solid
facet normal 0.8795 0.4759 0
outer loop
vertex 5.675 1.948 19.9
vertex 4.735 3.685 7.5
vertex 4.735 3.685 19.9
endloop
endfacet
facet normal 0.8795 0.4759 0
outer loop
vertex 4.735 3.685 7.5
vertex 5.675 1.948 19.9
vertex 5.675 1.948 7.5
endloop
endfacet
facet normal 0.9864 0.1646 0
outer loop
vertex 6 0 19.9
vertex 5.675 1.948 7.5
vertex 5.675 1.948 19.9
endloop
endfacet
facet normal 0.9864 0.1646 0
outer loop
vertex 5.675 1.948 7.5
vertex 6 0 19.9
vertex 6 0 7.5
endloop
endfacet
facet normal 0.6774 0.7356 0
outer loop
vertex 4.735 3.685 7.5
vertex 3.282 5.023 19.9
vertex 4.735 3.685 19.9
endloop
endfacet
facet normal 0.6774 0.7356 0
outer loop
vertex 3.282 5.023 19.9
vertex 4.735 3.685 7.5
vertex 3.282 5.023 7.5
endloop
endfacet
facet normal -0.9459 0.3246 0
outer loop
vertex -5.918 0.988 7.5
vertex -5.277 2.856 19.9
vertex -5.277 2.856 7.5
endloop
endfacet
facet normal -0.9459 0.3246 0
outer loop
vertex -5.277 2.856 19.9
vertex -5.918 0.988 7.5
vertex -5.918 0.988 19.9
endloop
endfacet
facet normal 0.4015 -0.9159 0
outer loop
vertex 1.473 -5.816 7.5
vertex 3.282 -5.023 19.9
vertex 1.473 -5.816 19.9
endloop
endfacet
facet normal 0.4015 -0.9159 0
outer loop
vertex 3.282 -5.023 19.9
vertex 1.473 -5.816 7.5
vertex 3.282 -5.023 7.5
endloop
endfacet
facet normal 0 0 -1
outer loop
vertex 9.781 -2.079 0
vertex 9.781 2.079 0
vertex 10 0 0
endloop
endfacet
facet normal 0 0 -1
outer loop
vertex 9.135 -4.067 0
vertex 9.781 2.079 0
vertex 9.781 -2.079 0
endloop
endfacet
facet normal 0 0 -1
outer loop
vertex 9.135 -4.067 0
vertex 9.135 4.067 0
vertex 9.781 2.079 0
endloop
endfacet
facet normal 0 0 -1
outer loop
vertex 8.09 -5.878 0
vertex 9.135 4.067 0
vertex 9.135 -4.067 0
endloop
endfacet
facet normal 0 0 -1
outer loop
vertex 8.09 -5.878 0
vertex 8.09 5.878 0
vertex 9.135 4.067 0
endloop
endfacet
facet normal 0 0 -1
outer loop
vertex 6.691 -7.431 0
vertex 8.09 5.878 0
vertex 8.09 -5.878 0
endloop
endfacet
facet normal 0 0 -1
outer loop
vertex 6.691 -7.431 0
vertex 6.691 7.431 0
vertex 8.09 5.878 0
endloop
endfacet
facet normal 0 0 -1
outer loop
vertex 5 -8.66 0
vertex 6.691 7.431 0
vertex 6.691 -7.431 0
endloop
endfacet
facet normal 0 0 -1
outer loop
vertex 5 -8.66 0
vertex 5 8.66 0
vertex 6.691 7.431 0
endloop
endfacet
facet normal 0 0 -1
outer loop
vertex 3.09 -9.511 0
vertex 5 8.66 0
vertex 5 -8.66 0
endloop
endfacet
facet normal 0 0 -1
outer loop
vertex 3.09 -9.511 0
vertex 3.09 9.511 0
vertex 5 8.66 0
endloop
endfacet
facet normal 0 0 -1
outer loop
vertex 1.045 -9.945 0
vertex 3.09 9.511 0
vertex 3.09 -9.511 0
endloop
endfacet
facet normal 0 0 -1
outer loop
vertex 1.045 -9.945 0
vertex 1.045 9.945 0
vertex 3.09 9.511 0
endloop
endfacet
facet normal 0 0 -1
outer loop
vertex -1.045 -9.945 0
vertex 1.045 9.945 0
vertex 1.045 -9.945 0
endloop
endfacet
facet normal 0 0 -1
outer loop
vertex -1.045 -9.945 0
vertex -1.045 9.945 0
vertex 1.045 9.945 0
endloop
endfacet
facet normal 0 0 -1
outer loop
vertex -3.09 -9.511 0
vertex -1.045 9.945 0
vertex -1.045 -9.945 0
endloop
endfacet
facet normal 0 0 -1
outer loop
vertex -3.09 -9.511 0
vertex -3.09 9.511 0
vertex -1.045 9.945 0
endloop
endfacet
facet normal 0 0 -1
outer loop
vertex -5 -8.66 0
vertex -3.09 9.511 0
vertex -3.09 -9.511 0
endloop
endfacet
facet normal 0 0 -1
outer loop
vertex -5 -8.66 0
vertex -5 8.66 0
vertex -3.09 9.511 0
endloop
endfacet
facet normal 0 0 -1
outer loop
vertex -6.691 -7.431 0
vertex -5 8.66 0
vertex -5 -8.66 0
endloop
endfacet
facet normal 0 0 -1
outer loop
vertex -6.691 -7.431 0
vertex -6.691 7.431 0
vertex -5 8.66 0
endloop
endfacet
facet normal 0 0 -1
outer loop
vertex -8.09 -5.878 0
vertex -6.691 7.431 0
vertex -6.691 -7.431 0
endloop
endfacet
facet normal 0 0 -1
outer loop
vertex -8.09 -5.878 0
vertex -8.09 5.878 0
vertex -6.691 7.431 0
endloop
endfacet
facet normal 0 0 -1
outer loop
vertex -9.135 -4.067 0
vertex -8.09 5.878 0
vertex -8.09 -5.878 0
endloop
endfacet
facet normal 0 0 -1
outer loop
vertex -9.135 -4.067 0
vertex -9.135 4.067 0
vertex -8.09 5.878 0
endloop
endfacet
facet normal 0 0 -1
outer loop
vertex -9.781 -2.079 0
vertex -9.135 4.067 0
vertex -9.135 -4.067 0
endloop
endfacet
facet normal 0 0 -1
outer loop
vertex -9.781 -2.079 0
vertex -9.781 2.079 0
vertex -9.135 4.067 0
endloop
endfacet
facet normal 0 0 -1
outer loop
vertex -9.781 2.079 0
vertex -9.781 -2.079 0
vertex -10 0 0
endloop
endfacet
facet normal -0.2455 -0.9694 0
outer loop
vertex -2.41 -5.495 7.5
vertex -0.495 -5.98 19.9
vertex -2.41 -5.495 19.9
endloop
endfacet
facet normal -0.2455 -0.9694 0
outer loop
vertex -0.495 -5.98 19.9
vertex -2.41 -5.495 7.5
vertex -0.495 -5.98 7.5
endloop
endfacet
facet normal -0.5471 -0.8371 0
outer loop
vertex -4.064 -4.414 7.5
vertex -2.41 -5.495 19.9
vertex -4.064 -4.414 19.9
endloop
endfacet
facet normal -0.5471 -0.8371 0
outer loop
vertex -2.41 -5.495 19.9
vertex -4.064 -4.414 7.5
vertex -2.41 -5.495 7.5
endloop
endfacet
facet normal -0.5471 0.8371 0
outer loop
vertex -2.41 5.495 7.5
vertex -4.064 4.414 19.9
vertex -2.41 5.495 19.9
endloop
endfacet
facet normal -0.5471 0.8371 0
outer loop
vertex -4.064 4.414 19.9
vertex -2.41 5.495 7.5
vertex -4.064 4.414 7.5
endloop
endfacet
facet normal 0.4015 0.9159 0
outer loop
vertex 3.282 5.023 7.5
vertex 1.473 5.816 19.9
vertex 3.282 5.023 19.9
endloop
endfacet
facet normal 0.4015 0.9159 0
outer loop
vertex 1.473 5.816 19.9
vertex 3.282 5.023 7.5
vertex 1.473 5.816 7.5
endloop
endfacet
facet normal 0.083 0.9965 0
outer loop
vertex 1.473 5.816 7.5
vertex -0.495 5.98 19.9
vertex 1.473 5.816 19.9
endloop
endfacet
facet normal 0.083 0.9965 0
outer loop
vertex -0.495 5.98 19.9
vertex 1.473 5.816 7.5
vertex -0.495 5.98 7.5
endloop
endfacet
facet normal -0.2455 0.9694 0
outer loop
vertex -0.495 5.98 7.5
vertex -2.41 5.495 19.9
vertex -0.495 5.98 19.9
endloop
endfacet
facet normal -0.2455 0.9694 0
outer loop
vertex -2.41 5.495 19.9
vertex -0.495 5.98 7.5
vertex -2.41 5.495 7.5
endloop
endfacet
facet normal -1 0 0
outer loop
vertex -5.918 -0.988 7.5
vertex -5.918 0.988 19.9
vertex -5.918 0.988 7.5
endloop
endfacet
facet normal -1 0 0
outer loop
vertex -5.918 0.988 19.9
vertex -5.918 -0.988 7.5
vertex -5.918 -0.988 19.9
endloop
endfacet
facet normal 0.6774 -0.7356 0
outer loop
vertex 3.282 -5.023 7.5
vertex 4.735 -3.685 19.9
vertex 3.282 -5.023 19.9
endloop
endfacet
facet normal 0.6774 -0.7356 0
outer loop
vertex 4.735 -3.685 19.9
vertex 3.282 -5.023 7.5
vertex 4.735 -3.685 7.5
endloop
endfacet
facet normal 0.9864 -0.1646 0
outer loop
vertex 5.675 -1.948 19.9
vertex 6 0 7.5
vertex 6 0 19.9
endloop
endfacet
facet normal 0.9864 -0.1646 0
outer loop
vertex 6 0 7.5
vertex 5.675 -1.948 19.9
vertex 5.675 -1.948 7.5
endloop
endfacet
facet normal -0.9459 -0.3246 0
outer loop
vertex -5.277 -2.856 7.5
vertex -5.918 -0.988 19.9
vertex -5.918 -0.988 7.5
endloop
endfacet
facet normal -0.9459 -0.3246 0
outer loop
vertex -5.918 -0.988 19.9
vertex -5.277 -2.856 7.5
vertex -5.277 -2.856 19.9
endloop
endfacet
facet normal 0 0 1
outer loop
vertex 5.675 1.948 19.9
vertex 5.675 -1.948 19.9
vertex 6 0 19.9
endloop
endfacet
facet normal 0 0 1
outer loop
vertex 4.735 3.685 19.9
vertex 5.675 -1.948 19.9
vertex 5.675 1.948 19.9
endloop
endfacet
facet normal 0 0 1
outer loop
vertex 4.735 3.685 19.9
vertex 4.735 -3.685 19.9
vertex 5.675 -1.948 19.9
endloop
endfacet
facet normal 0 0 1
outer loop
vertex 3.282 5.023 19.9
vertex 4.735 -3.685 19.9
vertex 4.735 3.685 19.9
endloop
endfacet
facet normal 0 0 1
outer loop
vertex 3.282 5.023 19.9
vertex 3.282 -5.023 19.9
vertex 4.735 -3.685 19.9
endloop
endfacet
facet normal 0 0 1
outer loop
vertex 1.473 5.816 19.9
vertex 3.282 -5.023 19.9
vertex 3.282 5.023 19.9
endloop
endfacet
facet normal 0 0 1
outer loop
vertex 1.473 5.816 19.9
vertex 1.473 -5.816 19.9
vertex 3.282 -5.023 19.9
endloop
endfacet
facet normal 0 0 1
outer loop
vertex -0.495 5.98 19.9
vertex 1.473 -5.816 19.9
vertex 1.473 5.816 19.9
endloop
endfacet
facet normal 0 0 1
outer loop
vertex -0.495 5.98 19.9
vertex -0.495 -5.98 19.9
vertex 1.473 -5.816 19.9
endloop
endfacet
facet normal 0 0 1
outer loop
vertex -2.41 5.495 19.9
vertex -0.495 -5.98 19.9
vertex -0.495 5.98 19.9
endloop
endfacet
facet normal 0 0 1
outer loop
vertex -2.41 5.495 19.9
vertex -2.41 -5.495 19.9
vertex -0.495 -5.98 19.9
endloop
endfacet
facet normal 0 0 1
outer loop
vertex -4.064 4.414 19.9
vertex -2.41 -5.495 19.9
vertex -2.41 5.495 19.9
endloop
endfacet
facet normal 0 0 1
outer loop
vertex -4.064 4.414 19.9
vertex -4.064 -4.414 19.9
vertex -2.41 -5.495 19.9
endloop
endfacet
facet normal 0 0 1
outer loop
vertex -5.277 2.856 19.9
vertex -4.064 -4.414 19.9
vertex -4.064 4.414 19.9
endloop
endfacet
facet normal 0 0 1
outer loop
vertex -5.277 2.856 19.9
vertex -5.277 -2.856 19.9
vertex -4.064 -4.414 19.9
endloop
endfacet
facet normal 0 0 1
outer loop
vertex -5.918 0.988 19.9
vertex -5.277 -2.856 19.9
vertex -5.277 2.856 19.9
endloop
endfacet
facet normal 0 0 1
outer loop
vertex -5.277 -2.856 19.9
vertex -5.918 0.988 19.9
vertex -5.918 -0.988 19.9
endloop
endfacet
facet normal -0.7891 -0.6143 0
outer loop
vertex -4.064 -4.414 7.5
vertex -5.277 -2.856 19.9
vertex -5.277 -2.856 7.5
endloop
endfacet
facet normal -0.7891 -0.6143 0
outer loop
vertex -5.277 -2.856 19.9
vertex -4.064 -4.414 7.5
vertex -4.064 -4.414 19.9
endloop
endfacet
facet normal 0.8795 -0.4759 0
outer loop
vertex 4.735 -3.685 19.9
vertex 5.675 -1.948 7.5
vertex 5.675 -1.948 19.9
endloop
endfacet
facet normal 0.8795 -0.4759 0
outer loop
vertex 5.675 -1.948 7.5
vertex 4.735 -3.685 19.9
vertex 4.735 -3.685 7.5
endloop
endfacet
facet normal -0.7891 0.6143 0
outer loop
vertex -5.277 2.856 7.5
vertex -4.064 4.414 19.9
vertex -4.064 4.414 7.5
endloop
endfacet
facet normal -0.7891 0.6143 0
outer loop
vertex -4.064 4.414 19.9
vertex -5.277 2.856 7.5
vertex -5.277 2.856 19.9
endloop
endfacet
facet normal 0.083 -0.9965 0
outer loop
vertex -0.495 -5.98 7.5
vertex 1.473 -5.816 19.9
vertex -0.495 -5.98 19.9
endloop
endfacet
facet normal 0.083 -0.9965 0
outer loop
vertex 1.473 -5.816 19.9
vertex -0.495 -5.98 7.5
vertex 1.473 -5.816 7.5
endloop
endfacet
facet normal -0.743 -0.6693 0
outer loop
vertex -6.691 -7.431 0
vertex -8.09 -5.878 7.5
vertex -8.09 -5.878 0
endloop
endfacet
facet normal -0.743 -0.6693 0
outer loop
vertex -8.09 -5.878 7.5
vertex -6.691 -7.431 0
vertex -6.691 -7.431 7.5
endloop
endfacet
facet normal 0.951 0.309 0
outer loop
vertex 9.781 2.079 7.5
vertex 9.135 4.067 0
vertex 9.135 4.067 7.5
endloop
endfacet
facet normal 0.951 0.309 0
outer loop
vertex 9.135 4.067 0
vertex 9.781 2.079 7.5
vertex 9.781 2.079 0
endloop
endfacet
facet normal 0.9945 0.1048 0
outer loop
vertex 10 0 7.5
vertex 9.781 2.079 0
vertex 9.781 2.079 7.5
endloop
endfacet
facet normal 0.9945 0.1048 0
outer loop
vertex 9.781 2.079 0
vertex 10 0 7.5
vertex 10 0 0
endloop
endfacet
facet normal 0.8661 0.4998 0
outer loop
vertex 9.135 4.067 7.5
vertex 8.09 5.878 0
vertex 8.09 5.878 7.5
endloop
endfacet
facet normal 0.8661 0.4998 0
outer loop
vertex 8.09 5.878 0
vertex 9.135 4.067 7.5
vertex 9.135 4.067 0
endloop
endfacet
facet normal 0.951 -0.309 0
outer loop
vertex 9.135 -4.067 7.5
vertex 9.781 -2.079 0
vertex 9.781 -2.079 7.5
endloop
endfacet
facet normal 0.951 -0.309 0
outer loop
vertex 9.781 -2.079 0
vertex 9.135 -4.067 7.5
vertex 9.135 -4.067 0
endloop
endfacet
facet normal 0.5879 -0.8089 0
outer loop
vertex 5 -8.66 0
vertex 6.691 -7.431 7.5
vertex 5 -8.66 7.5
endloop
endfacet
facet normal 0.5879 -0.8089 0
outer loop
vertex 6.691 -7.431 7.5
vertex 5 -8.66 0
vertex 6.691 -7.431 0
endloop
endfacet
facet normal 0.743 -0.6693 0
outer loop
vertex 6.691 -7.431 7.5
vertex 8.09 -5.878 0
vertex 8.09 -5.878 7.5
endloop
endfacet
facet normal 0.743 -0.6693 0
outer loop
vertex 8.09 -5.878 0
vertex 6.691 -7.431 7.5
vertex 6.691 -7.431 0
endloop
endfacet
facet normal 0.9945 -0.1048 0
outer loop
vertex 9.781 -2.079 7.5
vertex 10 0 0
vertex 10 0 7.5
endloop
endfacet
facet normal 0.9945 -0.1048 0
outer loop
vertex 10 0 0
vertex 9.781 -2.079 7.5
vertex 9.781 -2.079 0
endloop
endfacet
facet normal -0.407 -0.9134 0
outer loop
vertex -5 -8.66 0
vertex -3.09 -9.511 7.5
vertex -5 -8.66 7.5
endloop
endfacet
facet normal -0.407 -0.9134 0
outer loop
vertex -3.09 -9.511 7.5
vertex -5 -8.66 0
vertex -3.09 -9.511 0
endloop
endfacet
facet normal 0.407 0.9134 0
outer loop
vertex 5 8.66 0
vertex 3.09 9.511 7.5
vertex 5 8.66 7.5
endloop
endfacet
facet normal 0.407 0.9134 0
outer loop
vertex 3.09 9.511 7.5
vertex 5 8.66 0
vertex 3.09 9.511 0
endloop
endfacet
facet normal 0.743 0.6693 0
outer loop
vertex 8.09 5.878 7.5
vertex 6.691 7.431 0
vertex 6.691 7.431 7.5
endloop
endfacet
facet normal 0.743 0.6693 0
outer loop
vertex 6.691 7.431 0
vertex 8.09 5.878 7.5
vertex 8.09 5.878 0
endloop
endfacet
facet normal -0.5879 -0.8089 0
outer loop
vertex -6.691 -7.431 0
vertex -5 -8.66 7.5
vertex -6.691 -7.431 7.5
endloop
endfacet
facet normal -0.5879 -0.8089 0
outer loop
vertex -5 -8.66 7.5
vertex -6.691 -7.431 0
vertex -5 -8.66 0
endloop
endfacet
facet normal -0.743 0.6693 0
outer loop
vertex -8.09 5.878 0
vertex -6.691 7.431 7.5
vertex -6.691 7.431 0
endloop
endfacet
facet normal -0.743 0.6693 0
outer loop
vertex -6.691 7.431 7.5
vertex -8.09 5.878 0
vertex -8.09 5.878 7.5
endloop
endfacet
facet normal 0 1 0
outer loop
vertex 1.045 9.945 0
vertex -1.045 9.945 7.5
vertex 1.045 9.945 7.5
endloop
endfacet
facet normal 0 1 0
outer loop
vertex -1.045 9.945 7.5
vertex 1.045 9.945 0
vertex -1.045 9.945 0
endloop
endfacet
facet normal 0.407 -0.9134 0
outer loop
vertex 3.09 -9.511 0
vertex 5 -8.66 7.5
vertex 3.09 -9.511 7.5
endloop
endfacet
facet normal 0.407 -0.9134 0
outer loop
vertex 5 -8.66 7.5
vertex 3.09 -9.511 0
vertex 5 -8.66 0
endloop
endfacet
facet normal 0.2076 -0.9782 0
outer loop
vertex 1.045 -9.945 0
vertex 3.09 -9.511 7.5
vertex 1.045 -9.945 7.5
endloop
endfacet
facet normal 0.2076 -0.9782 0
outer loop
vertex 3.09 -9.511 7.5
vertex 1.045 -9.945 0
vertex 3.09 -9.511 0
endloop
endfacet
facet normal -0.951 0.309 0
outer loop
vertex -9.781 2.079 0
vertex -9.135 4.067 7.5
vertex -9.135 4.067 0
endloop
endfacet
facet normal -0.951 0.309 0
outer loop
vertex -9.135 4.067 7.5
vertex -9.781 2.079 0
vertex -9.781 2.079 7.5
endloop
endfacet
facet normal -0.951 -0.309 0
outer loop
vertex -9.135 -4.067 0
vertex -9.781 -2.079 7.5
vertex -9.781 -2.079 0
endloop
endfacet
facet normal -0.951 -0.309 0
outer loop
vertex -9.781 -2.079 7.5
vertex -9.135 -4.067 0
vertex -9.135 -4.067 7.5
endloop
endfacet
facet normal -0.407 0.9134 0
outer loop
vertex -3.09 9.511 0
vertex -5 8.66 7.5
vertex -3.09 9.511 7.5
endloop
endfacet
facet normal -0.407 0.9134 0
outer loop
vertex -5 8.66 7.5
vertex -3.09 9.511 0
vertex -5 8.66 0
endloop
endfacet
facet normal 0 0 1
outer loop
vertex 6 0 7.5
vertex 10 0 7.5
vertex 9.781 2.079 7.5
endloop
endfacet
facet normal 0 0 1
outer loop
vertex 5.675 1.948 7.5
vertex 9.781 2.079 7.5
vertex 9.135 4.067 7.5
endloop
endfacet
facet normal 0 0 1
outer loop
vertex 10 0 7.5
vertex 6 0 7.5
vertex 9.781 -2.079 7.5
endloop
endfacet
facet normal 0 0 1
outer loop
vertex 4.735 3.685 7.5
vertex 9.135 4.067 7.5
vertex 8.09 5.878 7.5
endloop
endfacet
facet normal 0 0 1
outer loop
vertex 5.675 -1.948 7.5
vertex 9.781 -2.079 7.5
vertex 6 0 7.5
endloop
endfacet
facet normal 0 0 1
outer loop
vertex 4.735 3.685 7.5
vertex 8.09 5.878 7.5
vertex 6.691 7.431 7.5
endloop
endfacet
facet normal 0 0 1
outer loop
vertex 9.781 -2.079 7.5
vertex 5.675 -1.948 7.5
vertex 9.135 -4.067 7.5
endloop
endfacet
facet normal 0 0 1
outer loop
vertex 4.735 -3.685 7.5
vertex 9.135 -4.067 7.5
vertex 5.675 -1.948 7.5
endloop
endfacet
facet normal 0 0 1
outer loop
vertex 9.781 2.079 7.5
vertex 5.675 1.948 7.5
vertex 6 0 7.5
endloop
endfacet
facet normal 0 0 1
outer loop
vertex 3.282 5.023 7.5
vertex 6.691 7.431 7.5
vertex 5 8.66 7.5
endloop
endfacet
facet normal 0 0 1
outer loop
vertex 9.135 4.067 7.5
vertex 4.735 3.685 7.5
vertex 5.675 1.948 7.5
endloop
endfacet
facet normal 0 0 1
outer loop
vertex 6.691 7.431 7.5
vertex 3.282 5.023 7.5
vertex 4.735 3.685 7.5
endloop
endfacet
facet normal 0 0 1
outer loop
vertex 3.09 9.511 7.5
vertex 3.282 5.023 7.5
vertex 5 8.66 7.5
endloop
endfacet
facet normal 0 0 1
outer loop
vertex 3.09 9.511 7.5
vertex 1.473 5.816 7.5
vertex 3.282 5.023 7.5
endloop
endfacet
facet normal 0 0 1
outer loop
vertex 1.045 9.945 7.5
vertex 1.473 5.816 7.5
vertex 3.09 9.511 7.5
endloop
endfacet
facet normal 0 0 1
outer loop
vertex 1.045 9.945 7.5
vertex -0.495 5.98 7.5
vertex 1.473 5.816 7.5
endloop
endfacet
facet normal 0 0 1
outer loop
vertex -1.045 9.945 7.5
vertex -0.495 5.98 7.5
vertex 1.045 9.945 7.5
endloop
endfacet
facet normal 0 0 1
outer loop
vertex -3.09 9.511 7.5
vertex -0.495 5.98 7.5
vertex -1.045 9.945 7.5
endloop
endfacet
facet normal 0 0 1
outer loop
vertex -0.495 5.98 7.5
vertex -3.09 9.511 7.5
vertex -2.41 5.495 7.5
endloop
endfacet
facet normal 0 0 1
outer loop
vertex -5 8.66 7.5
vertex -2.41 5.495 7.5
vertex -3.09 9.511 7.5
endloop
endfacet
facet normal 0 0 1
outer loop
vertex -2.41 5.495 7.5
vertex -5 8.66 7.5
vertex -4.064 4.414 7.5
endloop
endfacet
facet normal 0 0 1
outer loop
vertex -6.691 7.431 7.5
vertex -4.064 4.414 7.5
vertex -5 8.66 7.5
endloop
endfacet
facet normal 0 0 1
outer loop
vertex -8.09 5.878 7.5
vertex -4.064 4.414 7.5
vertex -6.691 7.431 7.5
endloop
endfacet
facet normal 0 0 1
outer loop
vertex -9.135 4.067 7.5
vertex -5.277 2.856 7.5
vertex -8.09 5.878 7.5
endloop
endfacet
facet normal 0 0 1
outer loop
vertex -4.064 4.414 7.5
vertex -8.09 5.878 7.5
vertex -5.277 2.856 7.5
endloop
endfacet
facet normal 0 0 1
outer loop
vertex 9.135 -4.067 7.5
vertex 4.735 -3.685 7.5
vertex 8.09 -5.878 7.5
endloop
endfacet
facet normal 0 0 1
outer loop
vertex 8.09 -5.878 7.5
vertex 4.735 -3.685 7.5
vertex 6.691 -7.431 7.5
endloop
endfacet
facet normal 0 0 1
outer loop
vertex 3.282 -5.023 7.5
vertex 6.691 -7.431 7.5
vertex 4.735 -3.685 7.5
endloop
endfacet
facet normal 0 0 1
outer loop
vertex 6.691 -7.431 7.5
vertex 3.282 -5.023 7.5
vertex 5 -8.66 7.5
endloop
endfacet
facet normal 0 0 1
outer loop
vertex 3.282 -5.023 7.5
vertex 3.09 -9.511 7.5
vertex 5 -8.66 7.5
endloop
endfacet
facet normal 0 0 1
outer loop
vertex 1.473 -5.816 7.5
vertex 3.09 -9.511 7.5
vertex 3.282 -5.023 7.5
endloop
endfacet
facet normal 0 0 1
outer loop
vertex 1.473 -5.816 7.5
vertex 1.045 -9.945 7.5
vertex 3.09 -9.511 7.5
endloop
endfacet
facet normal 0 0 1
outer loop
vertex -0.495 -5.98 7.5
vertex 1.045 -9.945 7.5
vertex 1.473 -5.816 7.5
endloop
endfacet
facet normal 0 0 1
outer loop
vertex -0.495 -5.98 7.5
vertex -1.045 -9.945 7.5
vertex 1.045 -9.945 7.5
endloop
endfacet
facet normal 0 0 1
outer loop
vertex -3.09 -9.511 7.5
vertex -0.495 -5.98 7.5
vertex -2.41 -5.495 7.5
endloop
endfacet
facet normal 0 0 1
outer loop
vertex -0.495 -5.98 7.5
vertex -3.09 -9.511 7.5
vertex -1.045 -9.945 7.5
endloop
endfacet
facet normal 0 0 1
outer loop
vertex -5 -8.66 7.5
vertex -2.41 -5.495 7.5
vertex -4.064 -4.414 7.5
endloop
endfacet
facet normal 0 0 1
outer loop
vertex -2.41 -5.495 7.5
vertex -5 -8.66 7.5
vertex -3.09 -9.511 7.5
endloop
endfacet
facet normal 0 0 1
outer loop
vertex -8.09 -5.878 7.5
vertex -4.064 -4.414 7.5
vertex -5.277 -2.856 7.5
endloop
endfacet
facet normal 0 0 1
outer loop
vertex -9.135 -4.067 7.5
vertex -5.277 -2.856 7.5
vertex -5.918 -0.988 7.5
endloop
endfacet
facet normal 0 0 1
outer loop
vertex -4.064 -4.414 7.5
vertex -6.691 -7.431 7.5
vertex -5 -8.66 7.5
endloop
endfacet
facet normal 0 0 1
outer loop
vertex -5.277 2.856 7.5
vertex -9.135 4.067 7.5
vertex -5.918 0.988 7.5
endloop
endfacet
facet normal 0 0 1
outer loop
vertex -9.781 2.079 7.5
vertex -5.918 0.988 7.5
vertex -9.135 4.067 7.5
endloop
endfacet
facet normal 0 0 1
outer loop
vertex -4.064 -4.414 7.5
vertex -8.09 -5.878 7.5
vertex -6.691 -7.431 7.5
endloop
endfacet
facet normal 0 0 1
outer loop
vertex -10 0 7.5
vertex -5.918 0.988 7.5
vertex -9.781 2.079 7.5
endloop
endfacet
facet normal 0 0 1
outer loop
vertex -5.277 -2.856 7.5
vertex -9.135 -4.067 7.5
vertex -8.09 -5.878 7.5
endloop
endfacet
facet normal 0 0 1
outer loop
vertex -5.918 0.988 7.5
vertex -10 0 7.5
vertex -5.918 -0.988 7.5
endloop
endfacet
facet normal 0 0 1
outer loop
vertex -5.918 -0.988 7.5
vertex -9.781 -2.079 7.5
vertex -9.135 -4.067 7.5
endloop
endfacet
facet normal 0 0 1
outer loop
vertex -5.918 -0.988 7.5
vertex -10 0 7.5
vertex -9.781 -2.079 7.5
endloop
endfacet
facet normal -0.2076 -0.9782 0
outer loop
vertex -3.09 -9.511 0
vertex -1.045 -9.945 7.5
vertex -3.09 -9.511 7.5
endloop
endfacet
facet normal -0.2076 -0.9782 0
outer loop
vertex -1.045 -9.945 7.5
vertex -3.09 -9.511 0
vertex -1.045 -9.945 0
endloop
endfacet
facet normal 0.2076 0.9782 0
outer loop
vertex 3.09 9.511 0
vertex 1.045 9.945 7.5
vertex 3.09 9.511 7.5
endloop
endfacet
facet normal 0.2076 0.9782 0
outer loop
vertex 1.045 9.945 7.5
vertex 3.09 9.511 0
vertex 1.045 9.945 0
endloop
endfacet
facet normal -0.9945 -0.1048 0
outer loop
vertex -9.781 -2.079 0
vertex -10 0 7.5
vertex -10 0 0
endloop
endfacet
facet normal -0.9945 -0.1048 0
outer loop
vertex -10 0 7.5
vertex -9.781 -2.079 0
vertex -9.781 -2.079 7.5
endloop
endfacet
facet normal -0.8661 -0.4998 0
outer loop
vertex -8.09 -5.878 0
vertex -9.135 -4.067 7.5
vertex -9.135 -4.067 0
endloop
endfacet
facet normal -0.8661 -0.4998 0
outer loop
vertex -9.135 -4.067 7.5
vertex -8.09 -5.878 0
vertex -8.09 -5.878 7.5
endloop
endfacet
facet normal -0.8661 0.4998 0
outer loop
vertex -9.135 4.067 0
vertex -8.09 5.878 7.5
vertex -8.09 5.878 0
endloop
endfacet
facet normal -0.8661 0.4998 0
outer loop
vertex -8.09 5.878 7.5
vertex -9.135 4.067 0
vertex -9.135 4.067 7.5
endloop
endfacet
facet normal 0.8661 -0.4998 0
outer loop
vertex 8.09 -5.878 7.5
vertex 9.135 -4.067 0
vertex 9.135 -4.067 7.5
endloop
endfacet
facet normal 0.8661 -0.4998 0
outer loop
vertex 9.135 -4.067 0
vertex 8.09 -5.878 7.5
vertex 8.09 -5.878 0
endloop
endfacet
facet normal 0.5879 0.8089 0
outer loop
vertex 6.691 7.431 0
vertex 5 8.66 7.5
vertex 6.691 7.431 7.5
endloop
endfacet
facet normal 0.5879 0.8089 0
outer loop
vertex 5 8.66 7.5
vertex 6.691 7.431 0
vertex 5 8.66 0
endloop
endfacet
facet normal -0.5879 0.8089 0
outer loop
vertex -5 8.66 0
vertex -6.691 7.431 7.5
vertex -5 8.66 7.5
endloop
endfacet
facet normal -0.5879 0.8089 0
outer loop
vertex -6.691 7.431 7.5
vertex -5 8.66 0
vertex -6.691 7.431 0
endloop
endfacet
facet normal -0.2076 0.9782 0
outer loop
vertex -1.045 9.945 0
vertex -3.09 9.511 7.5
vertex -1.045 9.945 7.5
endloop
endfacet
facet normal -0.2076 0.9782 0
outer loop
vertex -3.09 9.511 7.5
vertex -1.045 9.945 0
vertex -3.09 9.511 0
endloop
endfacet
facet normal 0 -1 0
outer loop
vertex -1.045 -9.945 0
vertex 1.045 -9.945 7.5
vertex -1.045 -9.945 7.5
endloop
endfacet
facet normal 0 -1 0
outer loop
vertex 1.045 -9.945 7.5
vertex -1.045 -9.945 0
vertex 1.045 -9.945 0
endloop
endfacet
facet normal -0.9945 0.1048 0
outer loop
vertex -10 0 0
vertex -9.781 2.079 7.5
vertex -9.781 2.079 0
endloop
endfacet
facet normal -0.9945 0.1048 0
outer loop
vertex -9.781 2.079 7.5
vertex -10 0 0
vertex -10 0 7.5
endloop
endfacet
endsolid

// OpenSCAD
module pully_dummy()
{
  cylinder(h=19.9, r=6);
  cylinder(h=7.5, r=10.);
}

pully_dummy();
